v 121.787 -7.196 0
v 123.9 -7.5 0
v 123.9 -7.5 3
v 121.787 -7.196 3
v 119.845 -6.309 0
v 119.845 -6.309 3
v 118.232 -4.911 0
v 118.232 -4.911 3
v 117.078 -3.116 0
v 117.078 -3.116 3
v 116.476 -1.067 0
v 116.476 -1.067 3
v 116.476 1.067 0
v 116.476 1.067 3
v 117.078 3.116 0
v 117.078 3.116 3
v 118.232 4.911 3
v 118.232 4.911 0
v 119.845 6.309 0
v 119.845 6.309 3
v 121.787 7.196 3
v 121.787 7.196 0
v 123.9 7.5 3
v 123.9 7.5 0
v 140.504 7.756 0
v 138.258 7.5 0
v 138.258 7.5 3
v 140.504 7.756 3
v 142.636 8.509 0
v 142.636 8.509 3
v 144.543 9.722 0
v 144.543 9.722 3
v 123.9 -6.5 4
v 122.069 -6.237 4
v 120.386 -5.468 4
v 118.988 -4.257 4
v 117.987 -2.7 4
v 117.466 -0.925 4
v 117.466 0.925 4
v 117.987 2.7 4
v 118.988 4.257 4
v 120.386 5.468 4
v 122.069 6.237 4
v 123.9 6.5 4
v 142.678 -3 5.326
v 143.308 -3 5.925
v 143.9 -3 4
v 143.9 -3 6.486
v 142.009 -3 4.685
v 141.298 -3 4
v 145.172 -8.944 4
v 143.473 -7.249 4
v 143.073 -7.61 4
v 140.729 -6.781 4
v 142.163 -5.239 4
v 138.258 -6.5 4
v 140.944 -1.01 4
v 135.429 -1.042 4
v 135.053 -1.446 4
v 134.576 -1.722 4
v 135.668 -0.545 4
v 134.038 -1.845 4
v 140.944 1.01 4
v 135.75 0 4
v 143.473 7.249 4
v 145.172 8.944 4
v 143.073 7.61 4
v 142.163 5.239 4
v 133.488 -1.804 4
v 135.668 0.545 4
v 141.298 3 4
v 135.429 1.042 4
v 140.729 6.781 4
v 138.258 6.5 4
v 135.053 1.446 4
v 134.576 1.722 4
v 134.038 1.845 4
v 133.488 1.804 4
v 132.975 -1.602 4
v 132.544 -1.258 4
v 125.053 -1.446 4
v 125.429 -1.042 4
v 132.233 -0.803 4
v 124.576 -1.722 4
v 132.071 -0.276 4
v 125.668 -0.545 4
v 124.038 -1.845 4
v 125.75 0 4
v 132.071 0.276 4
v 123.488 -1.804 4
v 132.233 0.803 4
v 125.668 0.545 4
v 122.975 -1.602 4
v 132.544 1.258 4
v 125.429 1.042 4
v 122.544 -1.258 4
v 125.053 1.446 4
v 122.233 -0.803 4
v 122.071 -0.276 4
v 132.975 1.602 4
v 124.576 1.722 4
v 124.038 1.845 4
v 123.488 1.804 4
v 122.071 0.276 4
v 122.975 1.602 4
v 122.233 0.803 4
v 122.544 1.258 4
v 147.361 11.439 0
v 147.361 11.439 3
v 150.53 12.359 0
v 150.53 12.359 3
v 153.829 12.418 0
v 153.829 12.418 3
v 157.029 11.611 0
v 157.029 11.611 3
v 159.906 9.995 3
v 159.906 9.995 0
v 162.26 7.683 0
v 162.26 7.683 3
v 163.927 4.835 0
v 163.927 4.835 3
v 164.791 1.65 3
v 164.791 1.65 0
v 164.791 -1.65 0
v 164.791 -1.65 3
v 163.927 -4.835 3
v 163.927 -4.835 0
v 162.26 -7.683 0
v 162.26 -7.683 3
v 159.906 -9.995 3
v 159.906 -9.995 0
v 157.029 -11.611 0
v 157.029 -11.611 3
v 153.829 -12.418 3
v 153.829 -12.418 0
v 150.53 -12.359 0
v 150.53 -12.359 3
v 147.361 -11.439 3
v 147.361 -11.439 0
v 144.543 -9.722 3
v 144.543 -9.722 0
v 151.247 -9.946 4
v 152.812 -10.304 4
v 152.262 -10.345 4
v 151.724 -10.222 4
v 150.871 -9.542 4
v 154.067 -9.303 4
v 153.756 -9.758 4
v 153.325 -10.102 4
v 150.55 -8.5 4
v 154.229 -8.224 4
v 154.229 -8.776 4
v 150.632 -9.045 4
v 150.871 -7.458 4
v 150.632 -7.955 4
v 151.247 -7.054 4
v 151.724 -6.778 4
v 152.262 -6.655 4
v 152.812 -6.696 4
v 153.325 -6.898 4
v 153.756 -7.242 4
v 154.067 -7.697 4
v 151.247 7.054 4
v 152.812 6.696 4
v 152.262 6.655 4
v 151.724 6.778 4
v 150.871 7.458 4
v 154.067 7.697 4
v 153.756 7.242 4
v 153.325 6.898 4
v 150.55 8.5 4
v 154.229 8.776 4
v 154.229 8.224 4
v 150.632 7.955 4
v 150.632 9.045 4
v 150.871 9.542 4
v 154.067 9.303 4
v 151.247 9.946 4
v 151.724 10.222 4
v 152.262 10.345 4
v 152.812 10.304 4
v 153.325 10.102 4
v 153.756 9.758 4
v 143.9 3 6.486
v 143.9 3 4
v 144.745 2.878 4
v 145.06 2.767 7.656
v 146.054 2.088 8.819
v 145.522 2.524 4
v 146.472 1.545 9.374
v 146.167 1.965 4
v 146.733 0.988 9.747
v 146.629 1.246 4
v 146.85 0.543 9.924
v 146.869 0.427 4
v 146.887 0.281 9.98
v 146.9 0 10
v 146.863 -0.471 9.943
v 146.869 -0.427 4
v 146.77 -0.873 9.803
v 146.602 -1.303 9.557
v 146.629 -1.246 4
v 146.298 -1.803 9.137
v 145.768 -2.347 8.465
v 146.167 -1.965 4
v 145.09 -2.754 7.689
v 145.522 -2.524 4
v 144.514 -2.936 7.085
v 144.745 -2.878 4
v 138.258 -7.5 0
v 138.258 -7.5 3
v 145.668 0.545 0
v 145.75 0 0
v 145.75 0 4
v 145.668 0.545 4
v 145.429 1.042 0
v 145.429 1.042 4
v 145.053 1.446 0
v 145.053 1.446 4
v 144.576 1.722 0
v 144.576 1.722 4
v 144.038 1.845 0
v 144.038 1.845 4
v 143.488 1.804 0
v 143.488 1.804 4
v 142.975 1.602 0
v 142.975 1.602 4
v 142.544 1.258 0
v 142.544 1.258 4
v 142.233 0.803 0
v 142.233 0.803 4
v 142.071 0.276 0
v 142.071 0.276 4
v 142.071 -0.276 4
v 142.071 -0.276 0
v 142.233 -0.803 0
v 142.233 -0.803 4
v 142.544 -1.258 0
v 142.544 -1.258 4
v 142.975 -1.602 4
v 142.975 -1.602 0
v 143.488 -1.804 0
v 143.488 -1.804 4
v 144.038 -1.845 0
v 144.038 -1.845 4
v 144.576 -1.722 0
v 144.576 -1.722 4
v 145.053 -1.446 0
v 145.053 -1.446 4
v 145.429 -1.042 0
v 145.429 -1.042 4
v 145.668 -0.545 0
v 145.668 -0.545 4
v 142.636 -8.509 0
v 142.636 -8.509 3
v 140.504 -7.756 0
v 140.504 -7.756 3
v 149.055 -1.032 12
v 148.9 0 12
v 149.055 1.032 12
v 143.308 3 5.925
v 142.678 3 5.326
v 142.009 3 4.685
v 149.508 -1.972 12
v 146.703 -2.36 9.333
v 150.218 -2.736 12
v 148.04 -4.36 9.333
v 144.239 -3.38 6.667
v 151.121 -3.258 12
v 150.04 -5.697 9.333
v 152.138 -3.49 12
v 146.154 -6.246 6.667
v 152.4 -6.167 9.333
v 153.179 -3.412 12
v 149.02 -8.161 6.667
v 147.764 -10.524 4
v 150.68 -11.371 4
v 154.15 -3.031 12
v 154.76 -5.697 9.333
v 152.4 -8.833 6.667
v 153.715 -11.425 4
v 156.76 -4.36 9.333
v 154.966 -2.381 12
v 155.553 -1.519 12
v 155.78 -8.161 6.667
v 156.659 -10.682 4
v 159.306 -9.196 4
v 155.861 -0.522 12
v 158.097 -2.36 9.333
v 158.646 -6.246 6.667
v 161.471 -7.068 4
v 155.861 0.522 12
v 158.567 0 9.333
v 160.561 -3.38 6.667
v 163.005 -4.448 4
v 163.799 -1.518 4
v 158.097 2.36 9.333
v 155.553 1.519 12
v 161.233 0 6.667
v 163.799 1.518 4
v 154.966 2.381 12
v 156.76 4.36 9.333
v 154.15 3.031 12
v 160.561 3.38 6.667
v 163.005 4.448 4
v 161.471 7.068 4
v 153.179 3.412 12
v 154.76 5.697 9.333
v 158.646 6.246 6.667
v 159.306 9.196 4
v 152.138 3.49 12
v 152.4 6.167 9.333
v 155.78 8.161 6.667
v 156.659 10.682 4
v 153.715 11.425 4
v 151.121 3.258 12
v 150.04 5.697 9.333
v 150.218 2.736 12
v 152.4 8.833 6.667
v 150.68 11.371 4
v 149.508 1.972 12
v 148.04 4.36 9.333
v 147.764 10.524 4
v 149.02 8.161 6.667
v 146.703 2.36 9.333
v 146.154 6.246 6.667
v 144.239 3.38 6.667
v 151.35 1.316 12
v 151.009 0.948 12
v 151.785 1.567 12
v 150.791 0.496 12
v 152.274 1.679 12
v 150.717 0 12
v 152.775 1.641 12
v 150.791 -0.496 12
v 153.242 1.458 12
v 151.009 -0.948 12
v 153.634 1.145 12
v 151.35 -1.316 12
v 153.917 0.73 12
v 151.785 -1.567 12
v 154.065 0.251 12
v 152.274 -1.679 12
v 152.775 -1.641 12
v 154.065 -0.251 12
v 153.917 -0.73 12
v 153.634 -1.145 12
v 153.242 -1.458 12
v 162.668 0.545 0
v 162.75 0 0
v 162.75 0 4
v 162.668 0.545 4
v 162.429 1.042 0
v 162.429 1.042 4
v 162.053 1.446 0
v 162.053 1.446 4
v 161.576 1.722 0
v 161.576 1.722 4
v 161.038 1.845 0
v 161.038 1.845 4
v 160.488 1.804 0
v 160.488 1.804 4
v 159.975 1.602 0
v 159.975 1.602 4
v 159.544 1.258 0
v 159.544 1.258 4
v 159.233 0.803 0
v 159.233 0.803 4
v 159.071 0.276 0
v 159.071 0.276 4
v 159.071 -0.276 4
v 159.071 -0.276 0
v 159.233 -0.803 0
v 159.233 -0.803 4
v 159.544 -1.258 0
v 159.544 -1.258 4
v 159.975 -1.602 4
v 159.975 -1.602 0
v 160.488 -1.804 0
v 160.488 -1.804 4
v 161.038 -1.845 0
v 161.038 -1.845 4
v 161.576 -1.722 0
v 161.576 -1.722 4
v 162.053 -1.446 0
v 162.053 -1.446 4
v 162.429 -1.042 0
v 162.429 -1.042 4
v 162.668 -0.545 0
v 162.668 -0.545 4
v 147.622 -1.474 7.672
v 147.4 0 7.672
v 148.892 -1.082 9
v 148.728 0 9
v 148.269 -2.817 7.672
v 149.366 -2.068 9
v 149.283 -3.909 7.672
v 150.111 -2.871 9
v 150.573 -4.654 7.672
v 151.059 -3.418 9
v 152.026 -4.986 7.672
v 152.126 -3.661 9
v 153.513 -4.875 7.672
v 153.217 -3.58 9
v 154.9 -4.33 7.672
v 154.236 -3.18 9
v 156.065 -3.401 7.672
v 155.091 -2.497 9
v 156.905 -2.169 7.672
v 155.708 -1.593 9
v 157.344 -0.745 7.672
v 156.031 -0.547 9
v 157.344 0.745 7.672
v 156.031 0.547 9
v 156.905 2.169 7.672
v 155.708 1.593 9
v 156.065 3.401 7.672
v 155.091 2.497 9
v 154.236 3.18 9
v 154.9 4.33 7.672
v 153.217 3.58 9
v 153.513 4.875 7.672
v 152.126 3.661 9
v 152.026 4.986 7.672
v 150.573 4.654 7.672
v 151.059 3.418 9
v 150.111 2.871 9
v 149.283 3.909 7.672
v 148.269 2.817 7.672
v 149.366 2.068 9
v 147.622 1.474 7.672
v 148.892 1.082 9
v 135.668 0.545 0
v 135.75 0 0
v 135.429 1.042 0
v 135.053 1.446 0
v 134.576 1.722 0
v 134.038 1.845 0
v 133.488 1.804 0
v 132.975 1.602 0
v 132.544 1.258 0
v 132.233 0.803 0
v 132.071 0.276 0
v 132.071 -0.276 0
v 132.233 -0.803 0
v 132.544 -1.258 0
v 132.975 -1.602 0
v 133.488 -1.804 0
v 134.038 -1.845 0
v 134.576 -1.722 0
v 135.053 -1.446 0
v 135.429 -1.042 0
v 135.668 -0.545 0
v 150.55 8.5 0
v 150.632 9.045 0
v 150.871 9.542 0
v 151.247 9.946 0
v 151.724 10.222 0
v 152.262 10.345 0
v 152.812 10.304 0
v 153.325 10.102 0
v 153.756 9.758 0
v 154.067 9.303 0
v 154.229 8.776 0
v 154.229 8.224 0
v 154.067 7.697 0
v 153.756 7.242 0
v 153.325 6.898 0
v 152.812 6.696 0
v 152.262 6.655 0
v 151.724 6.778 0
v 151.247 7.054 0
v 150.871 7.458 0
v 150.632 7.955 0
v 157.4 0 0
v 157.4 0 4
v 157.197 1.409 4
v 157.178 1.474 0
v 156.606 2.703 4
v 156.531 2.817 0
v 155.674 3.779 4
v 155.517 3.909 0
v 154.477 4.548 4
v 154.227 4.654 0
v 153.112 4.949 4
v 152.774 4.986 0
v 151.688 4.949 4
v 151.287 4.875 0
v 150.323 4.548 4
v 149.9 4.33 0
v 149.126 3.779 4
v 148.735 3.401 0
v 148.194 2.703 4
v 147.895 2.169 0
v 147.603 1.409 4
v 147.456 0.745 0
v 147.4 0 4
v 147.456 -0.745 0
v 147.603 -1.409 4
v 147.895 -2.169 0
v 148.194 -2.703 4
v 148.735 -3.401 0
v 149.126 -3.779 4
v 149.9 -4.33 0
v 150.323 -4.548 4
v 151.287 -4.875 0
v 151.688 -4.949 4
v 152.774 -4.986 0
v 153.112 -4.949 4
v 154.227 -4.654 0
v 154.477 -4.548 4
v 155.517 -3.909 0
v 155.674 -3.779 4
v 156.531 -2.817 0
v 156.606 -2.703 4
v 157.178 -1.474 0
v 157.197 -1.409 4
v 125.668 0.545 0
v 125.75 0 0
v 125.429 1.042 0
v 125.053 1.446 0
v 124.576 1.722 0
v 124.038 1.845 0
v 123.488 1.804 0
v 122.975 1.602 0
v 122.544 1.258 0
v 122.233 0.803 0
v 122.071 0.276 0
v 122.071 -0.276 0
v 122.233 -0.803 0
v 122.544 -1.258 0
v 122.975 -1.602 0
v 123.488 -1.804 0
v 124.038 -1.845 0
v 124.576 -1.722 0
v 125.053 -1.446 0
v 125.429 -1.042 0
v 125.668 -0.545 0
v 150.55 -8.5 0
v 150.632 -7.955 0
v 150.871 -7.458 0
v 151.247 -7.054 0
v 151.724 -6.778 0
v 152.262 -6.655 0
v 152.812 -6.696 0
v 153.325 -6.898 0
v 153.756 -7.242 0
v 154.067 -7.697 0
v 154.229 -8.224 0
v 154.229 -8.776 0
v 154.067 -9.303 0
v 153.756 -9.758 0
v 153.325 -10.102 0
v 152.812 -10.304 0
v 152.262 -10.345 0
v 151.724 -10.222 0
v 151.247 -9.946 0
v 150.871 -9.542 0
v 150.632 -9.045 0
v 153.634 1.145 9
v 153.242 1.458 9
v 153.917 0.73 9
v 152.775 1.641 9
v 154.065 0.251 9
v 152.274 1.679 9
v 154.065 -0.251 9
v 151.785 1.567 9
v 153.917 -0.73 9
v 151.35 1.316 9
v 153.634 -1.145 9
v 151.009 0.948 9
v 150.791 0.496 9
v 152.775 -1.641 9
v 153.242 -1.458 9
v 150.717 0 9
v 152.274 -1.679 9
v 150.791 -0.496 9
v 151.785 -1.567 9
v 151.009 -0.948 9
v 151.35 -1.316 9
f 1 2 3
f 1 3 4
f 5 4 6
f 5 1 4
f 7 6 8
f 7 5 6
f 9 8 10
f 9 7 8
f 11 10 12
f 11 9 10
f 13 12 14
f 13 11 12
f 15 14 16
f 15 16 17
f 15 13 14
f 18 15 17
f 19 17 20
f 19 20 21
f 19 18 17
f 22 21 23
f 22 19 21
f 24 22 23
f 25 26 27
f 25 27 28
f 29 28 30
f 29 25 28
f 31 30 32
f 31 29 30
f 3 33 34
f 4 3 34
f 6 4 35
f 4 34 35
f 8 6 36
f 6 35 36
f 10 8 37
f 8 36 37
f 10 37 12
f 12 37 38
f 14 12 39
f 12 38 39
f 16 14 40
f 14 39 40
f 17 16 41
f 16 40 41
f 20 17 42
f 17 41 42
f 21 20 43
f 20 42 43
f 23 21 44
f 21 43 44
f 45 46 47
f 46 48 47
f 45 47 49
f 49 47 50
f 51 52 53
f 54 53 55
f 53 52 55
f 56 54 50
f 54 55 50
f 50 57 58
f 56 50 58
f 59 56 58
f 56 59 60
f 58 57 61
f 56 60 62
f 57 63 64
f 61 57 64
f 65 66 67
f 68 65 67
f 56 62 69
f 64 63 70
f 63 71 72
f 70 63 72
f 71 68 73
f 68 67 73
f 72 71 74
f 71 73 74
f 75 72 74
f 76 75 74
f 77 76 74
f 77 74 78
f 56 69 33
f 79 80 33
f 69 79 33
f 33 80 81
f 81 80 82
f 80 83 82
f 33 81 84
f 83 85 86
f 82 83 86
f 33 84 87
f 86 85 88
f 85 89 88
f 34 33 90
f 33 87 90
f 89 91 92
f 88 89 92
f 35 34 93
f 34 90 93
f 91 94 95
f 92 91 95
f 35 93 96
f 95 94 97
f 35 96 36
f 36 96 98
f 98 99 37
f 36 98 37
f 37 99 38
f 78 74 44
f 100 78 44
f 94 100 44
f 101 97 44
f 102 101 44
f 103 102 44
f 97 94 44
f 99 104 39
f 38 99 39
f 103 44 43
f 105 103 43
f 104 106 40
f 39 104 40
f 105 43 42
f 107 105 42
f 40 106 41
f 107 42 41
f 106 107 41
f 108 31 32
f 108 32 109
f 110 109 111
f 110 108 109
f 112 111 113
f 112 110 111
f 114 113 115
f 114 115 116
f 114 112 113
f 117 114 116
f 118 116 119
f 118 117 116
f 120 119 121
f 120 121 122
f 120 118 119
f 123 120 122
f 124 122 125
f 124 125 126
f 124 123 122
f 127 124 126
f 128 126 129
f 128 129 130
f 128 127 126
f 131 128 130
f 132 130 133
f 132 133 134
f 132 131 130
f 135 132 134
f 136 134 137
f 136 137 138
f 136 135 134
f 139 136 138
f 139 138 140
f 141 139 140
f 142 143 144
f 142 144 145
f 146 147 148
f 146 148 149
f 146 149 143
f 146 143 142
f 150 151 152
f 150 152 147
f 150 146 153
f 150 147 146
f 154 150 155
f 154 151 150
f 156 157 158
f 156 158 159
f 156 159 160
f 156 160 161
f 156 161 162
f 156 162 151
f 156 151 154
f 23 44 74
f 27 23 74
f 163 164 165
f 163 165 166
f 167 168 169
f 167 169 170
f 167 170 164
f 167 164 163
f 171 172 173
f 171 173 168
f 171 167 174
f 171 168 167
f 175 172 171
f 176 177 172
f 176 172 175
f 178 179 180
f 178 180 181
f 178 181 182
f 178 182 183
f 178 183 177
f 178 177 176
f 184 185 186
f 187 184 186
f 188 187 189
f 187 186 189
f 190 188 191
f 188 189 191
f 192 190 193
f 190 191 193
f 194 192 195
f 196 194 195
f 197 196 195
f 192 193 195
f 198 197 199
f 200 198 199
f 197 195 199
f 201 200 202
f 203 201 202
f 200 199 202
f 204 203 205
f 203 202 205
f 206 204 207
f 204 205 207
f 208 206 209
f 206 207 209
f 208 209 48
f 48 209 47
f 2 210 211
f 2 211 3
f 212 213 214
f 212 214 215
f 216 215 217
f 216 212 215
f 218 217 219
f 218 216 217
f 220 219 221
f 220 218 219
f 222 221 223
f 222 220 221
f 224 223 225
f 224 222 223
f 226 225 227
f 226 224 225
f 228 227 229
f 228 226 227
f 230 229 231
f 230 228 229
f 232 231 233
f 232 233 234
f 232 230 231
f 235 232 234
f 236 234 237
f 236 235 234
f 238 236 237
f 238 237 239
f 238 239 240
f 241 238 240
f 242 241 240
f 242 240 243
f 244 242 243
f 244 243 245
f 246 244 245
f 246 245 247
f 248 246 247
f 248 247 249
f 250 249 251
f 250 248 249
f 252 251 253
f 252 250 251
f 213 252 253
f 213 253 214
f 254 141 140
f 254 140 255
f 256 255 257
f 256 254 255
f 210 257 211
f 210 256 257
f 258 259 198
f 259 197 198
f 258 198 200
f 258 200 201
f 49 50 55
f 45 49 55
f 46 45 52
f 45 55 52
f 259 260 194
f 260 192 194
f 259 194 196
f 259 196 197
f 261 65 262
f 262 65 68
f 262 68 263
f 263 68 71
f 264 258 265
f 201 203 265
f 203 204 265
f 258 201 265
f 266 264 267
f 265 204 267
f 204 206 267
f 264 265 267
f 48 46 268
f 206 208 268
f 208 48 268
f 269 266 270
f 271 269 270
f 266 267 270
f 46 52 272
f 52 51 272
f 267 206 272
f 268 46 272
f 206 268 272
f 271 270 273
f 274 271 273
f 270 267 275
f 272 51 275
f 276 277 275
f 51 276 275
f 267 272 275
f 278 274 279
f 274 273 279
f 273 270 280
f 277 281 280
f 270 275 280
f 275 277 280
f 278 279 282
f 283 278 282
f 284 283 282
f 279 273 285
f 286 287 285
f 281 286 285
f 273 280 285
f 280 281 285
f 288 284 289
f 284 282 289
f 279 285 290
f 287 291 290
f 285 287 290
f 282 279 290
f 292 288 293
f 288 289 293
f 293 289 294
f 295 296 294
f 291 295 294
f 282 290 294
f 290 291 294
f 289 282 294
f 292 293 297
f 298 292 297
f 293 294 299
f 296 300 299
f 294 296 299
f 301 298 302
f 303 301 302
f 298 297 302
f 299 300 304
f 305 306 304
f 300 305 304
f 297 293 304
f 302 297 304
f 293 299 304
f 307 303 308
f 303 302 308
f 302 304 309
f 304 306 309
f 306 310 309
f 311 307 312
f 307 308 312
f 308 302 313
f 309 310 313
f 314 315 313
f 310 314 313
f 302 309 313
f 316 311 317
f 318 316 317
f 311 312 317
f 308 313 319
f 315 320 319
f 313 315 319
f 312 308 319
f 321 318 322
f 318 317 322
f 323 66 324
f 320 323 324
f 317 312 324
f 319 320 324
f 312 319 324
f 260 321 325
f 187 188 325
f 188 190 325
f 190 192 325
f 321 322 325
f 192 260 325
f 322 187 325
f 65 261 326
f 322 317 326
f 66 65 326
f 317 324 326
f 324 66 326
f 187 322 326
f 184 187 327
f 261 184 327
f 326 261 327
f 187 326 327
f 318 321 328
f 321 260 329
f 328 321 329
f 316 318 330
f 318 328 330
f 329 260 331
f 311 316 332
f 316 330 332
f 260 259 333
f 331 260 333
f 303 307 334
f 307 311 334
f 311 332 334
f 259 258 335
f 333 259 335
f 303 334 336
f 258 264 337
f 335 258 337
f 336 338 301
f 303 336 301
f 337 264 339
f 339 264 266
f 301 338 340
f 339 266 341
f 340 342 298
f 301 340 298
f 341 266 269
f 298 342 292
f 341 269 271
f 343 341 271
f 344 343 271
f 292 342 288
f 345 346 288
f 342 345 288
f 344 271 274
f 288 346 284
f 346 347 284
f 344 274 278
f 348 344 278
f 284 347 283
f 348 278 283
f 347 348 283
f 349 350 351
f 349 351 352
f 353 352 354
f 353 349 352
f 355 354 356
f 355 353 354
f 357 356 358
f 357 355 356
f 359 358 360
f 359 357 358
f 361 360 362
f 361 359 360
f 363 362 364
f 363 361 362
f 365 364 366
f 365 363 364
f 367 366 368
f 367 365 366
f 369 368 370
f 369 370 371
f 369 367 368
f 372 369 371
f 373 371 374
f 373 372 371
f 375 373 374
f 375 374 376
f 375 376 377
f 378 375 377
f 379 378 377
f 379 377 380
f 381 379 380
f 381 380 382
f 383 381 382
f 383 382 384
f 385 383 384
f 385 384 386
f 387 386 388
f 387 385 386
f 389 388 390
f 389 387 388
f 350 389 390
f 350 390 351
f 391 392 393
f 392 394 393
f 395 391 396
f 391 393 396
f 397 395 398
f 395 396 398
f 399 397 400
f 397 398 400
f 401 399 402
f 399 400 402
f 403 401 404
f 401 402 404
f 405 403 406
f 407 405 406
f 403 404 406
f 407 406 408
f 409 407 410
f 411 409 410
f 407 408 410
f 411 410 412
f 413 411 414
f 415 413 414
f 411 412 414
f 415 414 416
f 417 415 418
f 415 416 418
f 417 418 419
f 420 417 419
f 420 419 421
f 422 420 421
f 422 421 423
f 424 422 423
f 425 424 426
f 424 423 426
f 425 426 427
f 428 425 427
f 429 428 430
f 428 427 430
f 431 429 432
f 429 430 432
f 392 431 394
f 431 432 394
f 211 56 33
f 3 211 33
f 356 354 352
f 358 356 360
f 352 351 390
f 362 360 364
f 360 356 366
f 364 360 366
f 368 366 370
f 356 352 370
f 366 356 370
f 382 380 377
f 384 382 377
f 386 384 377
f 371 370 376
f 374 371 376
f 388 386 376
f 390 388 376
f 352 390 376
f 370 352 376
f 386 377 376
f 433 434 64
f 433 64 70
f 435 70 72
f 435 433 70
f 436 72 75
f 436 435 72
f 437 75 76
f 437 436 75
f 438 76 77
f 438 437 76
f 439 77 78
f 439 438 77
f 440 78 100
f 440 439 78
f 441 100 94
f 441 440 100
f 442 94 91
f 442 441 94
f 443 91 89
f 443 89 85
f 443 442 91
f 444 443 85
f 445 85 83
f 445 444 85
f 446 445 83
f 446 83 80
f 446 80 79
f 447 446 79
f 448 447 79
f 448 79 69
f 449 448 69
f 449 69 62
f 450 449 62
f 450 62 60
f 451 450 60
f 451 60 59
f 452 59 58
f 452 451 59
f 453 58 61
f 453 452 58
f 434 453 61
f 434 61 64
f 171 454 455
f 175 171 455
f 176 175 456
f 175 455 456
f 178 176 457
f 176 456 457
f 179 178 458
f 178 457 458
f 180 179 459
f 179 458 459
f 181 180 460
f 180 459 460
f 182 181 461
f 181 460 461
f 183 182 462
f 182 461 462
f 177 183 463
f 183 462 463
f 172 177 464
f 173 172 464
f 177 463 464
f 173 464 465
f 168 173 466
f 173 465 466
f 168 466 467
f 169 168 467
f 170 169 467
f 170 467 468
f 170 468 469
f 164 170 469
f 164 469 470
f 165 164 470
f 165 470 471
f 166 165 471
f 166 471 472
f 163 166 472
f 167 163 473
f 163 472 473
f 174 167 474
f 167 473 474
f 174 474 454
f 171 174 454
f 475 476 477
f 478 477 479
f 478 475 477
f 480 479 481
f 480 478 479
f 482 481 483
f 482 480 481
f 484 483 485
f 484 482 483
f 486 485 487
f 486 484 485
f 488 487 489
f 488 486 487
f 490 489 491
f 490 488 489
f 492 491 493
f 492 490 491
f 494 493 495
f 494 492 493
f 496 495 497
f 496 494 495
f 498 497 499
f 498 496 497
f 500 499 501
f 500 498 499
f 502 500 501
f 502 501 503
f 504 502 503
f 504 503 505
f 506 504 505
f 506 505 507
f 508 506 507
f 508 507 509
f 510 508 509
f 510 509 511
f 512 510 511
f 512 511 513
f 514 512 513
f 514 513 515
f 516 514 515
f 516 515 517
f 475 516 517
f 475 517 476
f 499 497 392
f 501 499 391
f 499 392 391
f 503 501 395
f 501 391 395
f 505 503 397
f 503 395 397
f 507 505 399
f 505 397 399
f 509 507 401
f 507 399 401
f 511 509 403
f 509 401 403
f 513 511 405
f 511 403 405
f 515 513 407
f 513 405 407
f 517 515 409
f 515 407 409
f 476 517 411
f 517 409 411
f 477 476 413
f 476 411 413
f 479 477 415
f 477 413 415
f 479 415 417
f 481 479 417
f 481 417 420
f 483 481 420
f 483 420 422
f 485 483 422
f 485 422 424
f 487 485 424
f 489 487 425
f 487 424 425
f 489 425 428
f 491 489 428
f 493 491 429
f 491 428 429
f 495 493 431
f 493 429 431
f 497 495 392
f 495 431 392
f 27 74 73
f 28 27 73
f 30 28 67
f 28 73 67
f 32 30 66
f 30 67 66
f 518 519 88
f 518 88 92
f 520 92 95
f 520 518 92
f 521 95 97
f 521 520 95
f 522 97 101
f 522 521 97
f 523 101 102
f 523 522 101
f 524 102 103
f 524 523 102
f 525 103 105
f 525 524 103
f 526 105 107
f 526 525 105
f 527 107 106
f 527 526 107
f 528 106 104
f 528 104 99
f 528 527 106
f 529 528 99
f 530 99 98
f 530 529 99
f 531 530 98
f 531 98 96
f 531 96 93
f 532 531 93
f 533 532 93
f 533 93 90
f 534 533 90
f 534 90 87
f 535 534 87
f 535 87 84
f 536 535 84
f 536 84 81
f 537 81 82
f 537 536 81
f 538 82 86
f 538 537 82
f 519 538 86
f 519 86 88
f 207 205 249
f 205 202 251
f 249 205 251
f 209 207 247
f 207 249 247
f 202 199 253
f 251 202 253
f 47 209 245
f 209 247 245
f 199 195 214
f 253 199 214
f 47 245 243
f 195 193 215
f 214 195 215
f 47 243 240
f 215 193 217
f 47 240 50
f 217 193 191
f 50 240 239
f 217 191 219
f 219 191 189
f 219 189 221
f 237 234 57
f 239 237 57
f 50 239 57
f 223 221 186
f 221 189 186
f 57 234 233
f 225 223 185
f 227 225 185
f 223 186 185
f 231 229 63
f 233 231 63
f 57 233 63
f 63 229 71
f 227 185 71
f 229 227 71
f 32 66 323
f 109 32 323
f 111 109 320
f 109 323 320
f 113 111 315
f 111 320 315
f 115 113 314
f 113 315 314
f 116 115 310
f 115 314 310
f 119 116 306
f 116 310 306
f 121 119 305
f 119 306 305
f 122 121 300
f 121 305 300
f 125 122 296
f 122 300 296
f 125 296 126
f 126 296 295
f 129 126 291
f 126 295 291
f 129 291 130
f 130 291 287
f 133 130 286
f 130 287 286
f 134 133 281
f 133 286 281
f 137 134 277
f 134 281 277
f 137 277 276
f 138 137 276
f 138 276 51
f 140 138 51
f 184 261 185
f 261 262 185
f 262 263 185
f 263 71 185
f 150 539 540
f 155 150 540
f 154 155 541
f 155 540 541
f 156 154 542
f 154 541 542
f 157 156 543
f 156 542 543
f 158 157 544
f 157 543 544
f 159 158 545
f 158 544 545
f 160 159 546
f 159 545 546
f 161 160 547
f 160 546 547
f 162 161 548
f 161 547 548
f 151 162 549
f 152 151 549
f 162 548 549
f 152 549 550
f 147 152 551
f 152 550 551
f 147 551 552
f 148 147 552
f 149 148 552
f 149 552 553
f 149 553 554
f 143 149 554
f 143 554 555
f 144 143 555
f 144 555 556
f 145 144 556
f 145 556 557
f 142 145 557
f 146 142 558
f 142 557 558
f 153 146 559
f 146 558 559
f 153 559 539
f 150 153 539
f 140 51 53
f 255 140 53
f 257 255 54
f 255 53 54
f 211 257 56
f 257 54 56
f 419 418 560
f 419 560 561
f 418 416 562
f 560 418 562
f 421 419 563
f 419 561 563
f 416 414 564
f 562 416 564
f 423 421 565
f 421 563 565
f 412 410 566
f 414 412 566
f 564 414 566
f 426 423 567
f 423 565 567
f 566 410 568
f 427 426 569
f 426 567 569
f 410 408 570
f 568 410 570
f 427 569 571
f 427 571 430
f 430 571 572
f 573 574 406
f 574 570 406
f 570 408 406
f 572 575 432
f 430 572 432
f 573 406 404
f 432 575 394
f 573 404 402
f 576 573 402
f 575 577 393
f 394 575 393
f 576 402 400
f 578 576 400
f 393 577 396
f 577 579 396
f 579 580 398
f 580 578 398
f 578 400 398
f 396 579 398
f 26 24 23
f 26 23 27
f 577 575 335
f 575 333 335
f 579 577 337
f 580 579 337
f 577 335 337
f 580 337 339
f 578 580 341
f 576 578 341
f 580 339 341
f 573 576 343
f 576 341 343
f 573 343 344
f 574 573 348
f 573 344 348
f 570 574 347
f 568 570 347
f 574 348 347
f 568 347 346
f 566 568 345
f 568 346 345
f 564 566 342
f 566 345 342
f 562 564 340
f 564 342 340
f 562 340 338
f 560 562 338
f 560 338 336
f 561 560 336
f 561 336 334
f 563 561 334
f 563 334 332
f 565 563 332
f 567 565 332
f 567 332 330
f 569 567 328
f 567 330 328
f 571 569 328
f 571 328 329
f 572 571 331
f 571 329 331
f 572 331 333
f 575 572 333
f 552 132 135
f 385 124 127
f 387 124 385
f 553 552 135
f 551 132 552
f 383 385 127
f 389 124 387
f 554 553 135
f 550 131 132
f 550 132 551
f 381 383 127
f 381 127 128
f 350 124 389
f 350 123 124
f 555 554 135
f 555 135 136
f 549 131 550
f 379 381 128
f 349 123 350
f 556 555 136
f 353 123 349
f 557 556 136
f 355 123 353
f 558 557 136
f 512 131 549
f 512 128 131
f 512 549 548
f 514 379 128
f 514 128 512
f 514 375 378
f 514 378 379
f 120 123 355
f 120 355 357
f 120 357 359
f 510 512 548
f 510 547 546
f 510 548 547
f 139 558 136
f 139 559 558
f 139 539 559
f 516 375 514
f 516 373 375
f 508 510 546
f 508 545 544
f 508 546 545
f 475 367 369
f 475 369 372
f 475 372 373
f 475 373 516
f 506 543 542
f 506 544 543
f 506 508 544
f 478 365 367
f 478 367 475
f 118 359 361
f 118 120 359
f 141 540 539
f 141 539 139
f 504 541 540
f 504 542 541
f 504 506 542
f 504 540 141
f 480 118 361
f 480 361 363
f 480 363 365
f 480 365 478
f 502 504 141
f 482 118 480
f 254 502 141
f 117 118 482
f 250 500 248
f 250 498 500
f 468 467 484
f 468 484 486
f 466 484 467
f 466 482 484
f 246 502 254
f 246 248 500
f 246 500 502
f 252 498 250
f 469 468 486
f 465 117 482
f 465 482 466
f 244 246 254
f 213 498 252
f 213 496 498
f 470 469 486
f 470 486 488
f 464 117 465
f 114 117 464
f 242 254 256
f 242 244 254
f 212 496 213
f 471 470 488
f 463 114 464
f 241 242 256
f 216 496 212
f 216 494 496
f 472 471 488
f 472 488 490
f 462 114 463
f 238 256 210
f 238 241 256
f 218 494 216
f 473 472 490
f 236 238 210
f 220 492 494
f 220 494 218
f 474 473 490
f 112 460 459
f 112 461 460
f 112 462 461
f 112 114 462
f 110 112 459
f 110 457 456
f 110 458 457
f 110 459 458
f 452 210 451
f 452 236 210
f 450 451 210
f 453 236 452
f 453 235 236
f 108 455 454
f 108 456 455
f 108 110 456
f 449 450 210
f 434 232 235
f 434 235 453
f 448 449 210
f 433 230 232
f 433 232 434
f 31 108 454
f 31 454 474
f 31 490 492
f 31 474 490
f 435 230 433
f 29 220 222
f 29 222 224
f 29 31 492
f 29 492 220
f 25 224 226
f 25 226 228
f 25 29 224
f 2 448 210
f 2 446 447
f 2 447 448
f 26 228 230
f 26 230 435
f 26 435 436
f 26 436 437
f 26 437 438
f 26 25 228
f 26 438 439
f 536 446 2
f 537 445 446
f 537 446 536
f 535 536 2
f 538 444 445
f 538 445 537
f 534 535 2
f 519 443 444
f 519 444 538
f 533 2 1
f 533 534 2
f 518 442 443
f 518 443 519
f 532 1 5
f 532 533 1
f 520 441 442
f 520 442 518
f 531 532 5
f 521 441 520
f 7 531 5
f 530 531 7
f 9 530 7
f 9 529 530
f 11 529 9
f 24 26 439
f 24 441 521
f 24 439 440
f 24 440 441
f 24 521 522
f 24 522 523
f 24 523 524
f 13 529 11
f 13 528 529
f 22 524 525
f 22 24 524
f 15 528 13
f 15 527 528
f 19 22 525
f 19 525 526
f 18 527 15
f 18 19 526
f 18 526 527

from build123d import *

# Parameters (mm, degrees)
SKETCH1_R           = 1.85
SKETCH1_R_2         = 5
BOSS_EXTRUDE1_DEPTH = 4
CHAMFER1_SIZE       = 1
CUT_EXTRUDE1_DEPTH  = 166.566482115
SKETCH5_2_R         = 1.85
CUT_EXTRUDE2_DEPTH  = 4


with BuildPart() as part:
    # Sketch1 → Boss-Extrude1 (new body)
    with BuildSketch(Plane.XY):
        with BuildLine():
            Line((123.9, 7.5), (138.257864376, 7.5))
            ThreePointArc((138.257864376, 7.5), (141.59119771, 8.071909584), (144.543257987, 9.722222222))
            ThreePointArc((144.543257987, 9.722222222), (164.9, 0), (144.543257987, -9.722222222))
            ThreePointArc((144.543257987, -9.722222222), (141.59119771, -8.071909584), (138.257864376, -7.5))
            Line((138.257864376, -7.5), (123.9, -7.5))
            ThreePointArc((123.9, -7.5), (116.4, 0), (123.9, 7.5))
        make_face()
        with Locations((160.9, 0)):
            Circle(SKETCH1_R, mode=Mode.SUBTRACT)
        with Locations((152.4, 0)):
            Circle(SKETCH1_R_2, mode=Mode.SUBTRACT)
        with Locations((143.9, 0)):
            Circle(SKETCH1_R, mode=Mode.SUBTRACT)
        with Locations((133.9, 0)):
            Circle(SKETCH1_R, mode=Mode.SUBTRACT)
        with Locations((123.9, 0)):
            Circle(SKETCH1_R, mode=Mode.SUBTRACT)
    extrude(amount=BOSS_EXTRUDE1_DEPTH)

    # Chamfer1
    chamfer1_edges = [part.edges().sort_by_distance(p)[0] for p in [
        (141.59119771, 8.071909584, 4),
        (131.078932188, 7.5, 4),
        (116.4, 0, 4),
        (131.078932188, -7.5, 4),
        (141.59119771, -8.071909584, 4),
        (164.9, 0, 4),
    ]]
    chamfer(chamfer1_edges, length=CHAMFER1_SIZE)

    # Sketch3 → Revolve2 (revolve)
    with BuildSketch(Plane(origin=(152.4, 0, 0), x_dir=(0, 0, -1), z_dir=(1, 0, 0)), mode=Mode.PRIVATE) as revolve2_sk:
        Polygon((-4, -11.5), (-4, -5), (-7.671572875, -5), (-9, -3.671572875), (-9, -1.683342633), (-12, -1.683342633), (-12, -3.5), align=None)
    revolve(revolve2_sk.sketch.rotate(Axis((152.4, 0, 0), (0, 0, 1)), 270), axis=Axis((152.4, 0, 0), (0, 0, 1)))

    # Sketch4 → Cut-Extrude1 (cut, through all)
    with BuildSketch(Plane(origin=(0, 0, 4), x_dir=(-1, 0, 0), z_dir=(0, 0, -1))):
        with BuildLine():
            Line((-143.9, -3), (-141.298198344, -3))
            ThreePointArc((-141.298198344, -3), (-140.9, 0), (-141.298198344, 3))
            Line((-141.298198344, 3), (-143.9, 3))
            ThreePointArc((-143.9, 3), (-146.9, 0), (-143.9, -3))
        make_face()
    extrude(amount=-CUT_EXTRUDE1_DEPTH, mode=Mode.SUBTRACT)

    # Sketch5<2> → Cut-Extrude2 (cut)
    with BuildSketch(Plane(origin=(0, 0, 0), x_dir=(-1, 0, 0), z_dir=(0, 0, -1))):
        with Locations((-152.4, -8.5)):
            Circle(SKETCH5_2_R)
        with Locations((-152.4, 8.5)):
            Circle(SKETCH5_2_R)
    extrude(amount=-CUT_EXTRUDE2_DEPTH, mode=Mode.SUBTRACT)


solid = part.part
